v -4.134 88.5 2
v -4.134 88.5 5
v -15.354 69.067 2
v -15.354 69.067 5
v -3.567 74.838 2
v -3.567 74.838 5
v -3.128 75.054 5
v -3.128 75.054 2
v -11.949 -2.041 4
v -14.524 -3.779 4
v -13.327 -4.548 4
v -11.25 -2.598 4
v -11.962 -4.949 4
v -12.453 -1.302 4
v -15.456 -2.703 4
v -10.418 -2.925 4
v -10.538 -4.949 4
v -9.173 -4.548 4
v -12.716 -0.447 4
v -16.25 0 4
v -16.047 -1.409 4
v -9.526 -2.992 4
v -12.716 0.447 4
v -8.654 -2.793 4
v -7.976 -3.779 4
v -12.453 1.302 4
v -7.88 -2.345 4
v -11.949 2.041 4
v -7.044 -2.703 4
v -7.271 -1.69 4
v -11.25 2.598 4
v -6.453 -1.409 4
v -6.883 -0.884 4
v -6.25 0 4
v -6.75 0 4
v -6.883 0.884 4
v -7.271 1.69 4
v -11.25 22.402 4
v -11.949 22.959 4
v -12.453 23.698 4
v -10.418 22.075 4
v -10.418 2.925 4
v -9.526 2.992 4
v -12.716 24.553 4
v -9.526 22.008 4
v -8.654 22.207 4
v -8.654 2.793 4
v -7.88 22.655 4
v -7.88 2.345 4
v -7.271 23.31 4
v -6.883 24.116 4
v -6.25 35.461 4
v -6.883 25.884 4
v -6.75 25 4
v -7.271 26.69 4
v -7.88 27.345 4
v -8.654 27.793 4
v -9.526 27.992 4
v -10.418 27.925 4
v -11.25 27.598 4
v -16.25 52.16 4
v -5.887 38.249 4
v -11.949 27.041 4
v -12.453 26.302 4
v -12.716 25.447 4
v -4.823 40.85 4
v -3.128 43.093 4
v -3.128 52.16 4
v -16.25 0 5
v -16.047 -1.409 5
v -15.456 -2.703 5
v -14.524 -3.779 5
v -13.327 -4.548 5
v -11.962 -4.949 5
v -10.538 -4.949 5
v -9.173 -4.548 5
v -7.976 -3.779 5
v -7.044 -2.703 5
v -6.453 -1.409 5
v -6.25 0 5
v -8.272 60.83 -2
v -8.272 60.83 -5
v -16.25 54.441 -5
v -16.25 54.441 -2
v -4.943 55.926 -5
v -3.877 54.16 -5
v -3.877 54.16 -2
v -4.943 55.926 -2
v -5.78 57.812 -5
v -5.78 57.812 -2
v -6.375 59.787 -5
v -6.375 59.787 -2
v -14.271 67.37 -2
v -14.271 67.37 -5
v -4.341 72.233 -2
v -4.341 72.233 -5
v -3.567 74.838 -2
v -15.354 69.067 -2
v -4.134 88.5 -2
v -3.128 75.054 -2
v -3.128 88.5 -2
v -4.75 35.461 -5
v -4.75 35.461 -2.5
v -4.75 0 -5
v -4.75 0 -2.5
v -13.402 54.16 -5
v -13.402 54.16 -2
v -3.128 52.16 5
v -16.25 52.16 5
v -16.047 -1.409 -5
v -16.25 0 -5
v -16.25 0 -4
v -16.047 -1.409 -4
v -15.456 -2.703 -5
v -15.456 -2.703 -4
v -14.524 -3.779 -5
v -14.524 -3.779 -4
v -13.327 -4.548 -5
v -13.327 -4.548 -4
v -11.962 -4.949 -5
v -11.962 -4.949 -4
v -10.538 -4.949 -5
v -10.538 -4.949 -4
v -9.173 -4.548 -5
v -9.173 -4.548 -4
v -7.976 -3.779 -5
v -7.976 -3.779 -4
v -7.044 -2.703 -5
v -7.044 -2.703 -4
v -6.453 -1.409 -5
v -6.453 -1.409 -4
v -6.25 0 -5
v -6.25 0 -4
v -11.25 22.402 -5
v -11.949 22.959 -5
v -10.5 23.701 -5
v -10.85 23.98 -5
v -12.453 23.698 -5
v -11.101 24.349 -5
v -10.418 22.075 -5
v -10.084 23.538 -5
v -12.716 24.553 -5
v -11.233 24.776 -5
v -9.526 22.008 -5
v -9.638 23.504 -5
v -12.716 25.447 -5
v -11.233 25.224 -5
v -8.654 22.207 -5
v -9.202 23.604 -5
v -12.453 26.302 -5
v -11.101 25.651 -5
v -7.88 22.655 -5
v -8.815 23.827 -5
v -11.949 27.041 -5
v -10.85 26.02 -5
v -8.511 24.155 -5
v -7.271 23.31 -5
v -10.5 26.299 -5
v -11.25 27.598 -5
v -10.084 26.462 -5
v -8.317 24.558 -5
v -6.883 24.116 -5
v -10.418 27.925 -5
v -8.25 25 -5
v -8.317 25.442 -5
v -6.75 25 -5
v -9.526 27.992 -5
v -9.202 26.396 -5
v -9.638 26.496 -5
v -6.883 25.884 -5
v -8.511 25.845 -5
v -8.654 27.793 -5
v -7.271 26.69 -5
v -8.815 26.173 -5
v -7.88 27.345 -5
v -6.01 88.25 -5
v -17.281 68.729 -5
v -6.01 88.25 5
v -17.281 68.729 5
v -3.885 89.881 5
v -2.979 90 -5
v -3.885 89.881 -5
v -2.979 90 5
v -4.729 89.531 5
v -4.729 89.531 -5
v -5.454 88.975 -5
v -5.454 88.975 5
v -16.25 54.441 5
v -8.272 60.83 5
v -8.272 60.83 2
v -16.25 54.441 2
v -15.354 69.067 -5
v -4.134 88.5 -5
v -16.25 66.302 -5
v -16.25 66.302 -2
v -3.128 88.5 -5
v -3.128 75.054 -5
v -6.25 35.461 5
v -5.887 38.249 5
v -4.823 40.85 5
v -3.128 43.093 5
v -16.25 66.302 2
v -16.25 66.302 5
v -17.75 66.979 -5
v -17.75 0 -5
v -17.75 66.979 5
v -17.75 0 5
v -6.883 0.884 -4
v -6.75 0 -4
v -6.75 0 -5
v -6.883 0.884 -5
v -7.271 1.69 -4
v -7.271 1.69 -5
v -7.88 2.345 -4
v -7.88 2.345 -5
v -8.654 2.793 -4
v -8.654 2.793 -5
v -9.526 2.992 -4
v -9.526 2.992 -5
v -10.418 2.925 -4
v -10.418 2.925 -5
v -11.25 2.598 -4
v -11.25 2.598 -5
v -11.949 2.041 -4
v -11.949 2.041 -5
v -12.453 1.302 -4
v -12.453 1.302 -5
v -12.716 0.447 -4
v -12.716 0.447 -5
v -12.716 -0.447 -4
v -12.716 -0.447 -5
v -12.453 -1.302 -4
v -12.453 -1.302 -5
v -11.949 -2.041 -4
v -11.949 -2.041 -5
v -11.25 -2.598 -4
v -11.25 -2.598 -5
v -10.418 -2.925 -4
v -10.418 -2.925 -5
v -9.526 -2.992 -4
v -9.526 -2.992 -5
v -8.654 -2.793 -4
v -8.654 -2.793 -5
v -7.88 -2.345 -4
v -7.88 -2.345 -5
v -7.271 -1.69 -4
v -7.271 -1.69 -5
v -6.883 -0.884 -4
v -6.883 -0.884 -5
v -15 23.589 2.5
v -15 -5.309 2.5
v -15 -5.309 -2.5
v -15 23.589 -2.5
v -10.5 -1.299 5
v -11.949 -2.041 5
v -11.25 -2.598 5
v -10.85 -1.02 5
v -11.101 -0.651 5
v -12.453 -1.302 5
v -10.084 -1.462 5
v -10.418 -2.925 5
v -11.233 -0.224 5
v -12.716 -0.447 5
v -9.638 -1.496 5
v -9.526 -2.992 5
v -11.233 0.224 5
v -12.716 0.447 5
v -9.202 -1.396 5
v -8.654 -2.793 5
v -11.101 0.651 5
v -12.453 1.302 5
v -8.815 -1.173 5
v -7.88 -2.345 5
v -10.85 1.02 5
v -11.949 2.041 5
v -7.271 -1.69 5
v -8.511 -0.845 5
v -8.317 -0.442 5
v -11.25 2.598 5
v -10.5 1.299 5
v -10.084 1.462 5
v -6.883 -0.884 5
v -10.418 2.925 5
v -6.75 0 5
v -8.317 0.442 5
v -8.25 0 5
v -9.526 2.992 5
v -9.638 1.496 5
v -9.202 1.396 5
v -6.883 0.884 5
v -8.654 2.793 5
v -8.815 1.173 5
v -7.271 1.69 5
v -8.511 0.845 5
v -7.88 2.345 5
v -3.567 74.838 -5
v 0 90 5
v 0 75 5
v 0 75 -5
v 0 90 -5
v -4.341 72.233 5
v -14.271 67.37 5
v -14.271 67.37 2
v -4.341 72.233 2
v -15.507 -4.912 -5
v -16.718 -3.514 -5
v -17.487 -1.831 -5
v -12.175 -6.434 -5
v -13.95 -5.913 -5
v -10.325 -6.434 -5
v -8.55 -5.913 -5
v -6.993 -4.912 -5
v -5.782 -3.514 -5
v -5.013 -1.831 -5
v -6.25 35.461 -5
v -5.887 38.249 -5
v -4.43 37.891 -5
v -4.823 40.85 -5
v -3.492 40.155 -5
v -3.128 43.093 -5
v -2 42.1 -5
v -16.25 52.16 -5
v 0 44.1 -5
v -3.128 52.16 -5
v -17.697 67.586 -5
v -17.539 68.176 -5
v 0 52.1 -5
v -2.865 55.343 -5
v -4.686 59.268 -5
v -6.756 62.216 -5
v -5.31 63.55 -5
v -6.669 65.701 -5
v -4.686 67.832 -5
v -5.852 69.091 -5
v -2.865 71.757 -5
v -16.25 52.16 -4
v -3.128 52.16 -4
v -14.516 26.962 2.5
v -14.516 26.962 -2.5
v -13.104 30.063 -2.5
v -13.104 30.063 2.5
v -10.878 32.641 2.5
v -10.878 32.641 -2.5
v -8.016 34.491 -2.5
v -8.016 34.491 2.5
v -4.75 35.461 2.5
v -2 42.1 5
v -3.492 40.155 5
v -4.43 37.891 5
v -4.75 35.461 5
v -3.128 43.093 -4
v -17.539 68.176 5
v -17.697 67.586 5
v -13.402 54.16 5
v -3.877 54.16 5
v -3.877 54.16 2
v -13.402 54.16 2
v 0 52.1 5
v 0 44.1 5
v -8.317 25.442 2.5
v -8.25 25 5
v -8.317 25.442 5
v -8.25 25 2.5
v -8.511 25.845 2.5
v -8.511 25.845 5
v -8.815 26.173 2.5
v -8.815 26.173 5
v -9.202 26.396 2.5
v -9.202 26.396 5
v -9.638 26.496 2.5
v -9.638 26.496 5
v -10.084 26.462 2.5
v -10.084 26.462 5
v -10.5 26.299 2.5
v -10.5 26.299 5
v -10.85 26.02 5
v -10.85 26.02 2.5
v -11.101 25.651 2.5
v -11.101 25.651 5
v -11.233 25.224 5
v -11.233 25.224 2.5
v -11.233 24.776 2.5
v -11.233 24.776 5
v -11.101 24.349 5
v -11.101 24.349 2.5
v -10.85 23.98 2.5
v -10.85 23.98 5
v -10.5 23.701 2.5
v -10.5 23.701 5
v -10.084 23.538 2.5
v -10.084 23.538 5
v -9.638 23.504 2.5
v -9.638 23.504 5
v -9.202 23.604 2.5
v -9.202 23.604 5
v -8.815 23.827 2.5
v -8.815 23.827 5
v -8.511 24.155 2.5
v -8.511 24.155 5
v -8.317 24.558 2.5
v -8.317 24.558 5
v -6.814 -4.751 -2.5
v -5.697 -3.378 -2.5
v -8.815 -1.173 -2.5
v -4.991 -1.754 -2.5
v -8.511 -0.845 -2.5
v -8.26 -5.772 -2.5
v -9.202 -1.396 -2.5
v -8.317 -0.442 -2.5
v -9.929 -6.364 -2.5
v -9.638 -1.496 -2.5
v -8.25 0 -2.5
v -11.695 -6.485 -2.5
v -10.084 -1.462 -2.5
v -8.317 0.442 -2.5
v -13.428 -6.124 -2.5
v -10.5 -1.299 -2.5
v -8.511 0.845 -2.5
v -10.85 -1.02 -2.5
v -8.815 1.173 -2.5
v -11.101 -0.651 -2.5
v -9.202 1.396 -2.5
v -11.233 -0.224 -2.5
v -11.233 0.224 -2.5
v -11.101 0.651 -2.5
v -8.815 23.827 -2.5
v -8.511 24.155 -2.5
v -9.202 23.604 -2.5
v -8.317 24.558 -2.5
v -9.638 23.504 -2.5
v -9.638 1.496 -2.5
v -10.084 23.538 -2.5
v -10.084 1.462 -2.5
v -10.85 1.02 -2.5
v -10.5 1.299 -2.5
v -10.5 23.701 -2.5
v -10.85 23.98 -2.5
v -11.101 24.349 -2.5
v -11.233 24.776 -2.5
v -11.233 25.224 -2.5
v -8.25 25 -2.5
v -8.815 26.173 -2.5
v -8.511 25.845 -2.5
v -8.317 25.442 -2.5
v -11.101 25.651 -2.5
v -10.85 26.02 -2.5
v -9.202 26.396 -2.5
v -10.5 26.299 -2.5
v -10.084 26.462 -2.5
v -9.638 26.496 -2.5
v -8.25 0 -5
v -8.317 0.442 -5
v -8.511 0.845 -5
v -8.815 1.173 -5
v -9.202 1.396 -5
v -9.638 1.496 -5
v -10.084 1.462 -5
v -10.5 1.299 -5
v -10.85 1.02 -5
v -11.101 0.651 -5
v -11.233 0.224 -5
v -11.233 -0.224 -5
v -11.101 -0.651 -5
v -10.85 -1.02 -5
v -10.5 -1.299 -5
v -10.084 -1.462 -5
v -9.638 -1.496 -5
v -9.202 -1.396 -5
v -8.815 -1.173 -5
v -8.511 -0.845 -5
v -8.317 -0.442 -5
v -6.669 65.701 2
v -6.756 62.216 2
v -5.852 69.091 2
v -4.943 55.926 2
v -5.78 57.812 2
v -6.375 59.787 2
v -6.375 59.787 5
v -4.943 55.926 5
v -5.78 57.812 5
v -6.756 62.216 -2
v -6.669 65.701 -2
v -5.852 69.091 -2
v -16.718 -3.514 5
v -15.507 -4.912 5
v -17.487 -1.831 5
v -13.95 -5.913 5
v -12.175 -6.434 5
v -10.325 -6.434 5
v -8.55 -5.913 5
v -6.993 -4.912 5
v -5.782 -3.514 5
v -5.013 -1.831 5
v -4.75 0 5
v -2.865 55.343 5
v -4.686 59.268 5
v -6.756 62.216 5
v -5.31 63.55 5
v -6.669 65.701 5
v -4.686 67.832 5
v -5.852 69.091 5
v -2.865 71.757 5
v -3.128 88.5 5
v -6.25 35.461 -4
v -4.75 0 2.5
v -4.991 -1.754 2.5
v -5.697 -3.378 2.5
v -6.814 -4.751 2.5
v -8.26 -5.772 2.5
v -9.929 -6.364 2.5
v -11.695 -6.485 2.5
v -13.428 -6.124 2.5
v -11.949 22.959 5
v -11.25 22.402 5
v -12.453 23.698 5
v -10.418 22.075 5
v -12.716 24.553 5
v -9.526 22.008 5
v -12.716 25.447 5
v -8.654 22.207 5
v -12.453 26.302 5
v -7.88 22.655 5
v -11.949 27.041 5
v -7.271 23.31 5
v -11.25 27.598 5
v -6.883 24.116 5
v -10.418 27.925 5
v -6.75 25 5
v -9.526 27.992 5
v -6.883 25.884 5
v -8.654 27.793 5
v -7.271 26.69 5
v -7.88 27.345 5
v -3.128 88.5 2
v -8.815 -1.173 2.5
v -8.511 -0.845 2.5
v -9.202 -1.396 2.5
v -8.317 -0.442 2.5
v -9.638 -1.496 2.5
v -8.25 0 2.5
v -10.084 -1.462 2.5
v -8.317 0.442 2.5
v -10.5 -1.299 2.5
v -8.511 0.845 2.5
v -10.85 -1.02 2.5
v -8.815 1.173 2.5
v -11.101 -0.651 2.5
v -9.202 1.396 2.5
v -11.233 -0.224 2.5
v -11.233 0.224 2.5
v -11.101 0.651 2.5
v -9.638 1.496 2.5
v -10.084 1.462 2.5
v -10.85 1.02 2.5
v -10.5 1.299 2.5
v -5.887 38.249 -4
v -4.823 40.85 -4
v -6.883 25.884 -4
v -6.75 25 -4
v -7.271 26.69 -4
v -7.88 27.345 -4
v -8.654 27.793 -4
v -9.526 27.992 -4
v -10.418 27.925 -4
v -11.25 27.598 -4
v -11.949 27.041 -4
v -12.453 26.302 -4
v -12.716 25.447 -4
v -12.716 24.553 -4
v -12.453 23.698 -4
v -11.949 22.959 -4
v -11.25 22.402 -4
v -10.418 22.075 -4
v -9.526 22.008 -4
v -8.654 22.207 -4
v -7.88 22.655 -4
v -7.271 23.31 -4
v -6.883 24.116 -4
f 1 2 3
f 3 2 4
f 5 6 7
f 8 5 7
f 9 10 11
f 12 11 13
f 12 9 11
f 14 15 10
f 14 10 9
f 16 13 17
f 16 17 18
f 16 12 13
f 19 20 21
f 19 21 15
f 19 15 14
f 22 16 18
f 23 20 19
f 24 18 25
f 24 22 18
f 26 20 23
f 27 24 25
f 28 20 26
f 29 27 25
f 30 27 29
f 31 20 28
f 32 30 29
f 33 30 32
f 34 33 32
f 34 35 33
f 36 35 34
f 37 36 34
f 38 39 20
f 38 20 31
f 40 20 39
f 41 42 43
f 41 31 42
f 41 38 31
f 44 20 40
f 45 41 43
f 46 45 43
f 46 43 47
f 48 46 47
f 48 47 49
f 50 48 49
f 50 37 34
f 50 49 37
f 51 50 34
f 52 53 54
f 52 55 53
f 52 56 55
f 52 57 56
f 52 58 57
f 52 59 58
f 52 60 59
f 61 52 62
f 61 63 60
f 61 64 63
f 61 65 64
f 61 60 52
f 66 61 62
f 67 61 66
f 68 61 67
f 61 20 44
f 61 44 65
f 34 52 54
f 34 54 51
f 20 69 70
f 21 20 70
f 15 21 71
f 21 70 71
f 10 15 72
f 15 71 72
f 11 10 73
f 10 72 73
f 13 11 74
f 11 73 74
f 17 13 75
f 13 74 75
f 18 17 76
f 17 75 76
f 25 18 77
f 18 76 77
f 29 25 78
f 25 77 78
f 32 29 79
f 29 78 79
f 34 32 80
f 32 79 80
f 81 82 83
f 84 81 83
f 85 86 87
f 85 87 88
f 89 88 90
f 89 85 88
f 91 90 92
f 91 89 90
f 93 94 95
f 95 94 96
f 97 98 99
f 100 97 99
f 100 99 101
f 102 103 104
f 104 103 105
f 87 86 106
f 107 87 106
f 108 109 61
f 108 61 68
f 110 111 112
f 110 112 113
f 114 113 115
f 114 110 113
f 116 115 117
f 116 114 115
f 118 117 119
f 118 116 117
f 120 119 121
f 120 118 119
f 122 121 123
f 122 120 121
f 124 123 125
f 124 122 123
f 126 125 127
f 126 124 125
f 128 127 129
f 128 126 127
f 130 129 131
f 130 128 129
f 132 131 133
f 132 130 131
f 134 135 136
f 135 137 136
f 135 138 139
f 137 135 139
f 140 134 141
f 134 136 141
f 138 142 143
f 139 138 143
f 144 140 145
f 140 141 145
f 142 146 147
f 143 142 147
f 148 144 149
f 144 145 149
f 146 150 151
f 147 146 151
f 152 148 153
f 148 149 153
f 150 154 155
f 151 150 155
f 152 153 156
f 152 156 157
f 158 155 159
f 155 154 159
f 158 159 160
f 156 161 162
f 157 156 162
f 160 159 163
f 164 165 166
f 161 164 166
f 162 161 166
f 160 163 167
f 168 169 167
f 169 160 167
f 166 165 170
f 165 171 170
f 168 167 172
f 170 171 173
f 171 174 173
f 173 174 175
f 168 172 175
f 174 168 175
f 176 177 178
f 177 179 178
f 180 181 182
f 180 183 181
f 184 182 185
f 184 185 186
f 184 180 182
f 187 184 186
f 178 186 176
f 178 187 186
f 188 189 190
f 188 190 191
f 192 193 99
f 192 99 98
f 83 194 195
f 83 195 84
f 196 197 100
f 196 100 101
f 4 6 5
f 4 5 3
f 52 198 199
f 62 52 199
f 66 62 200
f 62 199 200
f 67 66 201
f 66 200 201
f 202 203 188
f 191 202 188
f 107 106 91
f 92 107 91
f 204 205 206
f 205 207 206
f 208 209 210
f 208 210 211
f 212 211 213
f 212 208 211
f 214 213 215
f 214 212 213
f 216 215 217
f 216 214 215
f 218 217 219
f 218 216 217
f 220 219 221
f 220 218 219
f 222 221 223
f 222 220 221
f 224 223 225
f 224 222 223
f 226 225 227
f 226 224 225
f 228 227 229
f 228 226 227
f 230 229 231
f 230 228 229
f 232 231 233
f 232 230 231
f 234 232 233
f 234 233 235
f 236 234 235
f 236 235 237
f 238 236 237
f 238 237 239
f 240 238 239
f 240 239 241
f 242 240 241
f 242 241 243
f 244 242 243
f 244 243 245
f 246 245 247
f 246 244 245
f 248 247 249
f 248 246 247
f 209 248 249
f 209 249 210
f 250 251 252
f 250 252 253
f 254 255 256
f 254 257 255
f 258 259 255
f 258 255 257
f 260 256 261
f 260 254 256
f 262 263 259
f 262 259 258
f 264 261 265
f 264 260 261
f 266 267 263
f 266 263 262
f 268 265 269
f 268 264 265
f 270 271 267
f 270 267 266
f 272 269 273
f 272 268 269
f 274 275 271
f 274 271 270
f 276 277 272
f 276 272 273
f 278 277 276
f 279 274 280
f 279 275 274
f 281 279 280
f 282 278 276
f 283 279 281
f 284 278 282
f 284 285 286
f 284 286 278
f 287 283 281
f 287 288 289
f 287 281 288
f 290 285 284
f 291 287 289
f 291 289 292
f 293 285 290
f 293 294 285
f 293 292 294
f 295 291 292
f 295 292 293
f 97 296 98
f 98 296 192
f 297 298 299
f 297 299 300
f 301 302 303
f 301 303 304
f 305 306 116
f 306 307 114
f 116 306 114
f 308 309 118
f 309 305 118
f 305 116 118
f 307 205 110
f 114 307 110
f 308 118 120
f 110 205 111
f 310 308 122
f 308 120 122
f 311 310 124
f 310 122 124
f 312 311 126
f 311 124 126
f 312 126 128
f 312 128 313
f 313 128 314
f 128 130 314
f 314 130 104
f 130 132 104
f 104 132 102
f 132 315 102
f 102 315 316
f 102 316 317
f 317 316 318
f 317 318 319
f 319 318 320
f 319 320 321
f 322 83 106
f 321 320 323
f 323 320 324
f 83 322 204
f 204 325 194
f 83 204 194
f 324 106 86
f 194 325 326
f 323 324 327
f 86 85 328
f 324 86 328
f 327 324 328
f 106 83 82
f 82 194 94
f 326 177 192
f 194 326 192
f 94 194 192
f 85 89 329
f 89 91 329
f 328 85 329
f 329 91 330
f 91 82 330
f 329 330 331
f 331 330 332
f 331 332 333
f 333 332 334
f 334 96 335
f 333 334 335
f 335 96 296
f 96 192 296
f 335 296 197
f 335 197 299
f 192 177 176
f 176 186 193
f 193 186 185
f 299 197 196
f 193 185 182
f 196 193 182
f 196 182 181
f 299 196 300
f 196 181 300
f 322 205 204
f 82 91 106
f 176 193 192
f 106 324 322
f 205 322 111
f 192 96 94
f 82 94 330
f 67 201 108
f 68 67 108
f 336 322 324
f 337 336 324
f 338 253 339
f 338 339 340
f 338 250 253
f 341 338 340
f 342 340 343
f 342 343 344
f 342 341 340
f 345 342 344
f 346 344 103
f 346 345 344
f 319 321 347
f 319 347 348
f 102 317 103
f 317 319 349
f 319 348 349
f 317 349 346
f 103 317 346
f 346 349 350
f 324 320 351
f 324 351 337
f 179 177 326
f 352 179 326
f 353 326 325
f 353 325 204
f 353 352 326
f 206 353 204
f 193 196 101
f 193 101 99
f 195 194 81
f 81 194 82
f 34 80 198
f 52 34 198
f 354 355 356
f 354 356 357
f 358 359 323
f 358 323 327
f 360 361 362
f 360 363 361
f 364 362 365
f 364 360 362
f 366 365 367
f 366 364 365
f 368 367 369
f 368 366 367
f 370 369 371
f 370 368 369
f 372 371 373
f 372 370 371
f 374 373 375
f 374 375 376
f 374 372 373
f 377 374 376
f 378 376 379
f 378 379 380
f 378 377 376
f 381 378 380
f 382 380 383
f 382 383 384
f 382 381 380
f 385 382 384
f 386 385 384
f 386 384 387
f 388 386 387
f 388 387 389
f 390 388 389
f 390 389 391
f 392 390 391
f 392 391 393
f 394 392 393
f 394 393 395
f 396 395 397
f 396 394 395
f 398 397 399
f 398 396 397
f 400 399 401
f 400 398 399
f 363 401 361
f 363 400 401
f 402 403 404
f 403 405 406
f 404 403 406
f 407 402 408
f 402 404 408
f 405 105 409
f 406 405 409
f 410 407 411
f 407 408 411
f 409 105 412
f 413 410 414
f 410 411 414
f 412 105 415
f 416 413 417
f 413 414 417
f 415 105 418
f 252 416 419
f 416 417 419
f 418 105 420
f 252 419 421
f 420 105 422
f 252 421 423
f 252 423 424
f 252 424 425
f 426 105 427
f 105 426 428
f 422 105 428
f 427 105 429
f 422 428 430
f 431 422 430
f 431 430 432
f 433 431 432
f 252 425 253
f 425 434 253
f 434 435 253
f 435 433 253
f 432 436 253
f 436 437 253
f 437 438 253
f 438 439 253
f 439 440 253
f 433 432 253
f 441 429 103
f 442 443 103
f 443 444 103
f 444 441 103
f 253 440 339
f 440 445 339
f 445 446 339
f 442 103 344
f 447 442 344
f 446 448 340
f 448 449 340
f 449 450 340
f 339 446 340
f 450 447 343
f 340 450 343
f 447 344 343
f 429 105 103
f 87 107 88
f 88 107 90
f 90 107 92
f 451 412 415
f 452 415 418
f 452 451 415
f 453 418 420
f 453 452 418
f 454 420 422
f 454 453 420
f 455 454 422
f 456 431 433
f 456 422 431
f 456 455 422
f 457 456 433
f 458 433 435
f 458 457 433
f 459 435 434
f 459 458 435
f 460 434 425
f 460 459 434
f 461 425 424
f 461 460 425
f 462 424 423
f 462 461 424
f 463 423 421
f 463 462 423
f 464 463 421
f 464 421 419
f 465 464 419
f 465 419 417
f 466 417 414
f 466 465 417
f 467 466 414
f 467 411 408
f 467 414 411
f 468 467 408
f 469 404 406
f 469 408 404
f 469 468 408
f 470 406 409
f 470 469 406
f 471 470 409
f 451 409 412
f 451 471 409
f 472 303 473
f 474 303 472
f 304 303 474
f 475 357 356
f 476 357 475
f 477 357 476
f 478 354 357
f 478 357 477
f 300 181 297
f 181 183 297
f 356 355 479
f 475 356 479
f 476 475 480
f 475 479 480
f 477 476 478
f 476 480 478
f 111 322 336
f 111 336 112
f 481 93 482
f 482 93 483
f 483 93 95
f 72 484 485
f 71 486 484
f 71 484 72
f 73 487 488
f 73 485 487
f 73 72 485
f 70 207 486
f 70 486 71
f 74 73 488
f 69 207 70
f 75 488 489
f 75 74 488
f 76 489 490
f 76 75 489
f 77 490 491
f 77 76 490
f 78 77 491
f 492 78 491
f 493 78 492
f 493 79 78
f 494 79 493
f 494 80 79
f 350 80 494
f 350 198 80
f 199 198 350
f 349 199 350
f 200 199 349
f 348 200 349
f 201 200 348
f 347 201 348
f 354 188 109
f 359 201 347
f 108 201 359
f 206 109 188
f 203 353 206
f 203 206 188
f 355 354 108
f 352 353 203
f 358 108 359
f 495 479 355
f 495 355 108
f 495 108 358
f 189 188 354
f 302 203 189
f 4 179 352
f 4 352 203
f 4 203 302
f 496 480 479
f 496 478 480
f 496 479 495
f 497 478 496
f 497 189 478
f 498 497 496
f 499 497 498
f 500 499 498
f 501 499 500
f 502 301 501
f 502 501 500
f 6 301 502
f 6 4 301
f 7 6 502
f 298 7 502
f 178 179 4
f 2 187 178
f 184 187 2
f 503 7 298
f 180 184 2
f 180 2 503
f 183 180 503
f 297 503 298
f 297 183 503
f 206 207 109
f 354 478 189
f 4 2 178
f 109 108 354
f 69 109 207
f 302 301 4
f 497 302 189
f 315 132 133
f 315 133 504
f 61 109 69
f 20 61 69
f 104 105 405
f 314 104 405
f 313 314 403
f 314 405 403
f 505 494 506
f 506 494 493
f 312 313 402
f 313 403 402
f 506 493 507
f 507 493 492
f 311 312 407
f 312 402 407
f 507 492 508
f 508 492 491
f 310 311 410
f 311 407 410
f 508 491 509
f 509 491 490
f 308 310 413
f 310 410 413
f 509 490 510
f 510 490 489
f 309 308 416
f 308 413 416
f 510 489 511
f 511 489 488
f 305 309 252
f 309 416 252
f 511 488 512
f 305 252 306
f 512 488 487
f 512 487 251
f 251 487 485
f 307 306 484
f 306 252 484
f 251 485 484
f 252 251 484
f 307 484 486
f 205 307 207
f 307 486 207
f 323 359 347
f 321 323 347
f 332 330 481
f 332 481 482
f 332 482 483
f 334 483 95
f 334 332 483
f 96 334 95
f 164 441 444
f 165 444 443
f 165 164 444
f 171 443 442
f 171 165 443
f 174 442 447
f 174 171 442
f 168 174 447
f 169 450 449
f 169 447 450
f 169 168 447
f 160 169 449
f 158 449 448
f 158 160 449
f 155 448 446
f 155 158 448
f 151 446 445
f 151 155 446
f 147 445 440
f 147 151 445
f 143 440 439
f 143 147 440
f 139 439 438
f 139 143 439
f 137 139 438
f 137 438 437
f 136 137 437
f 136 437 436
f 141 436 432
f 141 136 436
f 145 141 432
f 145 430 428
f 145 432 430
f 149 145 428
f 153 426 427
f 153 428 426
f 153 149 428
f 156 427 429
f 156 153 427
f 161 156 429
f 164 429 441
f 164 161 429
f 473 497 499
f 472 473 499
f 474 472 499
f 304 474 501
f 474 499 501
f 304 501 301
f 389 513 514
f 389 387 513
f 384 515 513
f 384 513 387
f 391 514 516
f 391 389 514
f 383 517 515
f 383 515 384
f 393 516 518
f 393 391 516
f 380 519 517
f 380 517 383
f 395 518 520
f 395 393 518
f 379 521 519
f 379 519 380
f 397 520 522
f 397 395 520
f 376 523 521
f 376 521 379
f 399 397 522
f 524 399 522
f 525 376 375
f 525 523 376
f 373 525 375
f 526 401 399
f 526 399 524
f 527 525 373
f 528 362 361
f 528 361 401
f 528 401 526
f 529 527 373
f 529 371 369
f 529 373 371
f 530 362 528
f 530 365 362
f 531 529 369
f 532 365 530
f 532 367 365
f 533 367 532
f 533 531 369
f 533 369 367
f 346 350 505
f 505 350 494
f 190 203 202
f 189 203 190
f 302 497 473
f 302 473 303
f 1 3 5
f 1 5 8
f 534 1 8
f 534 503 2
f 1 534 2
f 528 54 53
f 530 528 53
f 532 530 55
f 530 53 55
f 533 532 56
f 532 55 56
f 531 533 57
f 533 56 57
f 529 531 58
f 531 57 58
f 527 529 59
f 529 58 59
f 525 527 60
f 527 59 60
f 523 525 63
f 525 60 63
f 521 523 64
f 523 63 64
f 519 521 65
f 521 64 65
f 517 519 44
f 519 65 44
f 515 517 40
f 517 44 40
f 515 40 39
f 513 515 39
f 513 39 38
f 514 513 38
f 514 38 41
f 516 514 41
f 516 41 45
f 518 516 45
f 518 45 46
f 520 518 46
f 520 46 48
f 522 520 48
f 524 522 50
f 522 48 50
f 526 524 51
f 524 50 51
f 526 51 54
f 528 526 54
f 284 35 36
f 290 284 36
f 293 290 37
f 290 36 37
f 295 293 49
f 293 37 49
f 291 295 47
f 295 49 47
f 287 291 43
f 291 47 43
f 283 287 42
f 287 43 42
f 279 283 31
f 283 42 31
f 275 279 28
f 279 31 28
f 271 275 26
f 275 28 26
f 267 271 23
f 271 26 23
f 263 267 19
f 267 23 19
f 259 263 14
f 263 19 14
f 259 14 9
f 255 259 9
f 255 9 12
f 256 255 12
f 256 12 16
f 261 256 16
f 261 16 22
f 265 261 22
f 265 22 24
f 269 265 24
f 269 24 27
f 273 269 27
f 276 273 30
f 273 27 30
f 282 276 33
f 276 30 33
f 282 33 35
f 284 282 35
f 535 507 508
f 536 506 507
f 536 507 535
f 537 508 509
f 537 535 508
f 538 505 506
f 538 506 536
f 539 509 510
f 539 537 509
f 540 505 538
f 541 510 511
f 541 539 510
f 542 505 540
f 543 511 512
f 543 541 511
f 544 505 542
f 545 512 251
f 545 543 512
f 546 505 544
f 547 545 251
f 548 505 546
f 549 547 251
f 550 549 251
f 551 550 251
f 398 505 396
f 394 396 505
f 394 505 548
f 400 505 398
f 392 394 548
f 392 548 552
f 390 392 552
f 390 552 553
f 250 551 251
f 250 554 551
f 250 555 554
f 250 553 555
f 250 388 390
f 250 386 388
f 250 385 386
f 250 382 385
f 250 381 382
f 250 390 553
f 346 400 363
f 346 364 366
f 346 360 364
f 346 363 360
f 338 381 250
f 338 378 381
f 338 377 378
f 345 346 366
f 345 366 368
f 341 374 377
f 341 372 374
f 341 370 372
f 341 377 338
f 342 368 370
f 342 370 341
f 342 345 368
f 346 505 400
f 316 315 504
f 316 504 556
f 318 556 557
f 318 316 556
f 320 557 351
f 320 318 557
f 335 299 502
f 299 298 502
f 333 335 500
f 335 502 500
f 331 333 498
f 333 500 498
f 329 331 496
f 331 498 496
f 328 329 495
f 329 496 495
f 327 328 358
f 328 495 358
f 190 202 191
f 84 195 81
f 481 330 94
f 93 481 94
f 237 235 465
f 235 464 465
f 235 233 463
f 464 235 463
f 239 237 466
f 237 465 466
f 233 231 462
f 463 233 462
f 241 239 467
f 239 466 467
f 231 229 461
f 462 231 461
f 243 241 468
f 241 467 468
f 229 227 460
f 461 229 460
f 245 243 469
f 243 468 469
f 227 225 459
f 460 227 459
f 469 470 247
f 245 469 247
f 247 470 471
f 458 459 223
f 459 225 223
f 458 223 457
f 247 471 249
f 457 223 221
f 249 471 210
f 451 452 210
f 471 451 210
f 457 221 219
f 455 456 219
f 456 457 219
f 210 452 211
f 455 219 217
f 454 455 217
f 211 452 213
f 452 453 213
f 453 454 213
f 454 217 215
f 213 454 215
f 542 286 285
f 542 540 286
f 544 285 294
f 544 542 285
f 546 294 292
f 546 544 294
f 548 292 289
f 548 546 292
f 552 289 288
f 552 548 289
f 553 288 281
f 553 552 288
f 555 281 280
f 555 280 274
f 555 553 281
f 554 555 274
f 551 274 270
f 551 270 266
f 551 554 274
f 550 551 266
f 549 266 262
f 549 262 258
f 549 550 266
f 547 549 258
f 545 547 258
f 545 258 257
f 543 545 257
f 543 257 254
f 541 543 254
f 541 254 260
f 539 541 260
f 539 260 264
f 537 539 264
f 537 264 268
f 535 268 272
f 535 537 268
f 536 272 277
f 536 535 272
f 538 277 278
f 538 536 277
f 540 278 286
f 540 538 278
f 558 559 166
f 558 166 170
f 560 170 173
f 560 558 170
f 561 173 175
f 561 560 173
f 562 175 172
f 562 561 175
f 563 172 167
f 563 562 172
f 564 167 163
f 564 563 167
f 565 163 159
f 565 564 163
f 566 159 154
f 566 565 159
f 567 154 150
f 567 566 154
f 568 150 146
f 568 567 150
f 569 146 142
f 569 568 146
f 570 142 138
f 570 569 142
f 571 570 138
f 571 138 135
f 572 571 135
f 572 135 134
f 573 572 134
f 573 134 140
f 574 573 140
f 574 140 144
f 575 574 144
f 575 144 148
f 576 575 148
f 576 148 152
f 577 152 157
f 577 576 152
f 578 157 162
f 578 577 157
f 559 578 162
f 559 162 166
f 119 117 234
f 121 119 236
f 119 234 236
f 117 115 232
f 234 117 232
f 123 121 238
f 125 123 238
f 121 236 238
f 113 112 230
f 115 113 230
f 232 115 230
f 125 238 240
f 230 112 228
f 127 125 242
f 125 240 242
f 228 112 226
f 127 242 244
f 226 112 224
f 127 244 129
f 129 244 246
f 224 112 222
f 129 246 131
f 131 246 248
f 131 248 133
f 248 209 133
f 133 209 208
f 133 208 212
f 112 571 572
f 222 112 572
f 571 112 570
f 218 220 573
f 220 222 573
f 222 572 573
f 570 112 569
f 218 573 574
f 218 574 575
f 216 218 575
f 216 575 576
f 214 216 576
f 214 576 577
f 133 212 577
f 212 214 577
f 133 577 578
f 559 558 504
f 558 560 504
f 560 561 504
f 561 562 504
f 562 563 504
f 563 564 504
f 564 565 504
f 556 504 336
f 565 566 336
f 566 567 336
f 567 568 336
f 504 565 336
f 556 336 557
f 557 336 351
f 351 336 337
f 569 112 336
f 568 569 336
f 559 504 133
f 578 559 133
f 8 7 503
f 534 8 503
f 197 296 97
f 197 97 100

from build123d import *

# Parameters (mm, degrees)
SKETCH1_R           = 1.5
BOSS_EXTRUDE1_DEPTH = 5
CUT_EXTRUDE1_DEPTH  = 2.5
CUT_EXTRUDE3_DEPTH  = 1
SKETCH4_R           = 3
SKETCH4_R_2         = 1.5
EXTRUDE_THIN1_DEPTH = 1
CUT_EXTRUDE4_DEPTH  = 2
EXTRUDE_THIN2_REACH = 94.277
BOSS_EXTRUDE2_REACH = 94.277
FILLET1_R           = 3.5
BOSS_EXTRUDE8_DEPTH = 10


with BuildPart() as part:
    # Sketch1 → Boss-Extrude1 (new, symmetric)
    with BuildSketch(Plane.XY):
        with BuildLine():
            Line((0, 88.5), (-2, 86.5))
            Line((-2, 86.5), (0, 84.5))
            Line((0, 84.5), (-2, 82.5))
            Line((-2, 82.5), (0, 80.5))
            Line((0, 80.5), (-2, 78.5))
            Line((-2, 78.5), (0, 76.5))
            Line((0, 76.5), (0, 75))
            ThreePointArc((0, 75), (-5.309927761, 63.55), (0, 52.1))
            Line((0, 52.1), (-2, 50.1))
            Line((-2, 50.1), (0, 48.1))
            Line((0, 48.1), (-2, 46.1))
            Line((-2, 46.1), (0, 44.1))
            Line((0, 44.1), (-2, 42.1))
            ThreePointArc((-2, 42.1), (-4.035298286, 39.053960857), (-4.75, 35.460912703))
            Line((-4.75, 35.460912703), (-4.75, 0))
            ThreePointArc((-4.75, 0), (-11.25, -6.5), (-17.75, 0))
            Line((-17.75, 0), (-17.75, 67.916352203))
            Line((-17.75, 67.916352203), (-5, 90))
            Line((-5, 90), (0, 90))
            Line((0, 90), (0, 88.5))
        make_face()
        with Locations((-9.75, 0)):
            Circle(SKETCH1_R, mode=Mode.SUBTRACT)
        with Locations((-9.75, 25)):
            Circle(SKETCH1_R, mode=Mode.SUBTRACT)
    extrude(amount=BOSS_EXTRUDE1_DEPTH, both=True)

    # Sketch2 → Cut-Extrude1 (cut, symmetric)
    with BuildSketch(Plane.XY):
        with BuildLine():
            Line((-15, -8.410797367), (-15, 23.589202633))
            ThreePointArc((-15, 23.589202633), (-12.082951062, 31.431396204), (-4.75, 35.460912703))
            Line((-4.75, 35.460912703), (-4.75, -8.410797367))
            Line((-4.75, -8.410797367), (-15, -8.410797367))
        make_face()
    cut_extrude1 = extrude(amount=CUT_EXTRUDE1_DEPTH, both=True, mode=Mode.SUBTRACT)

    # Sketch3 → Cut-Extrude3 (cut)
    with BuildSketch(Plane.XY.offset(5)):
        with BuildLine():
            Line((-3.12764747, 88.5), (-4.133974596, 88.5))
            Line((-4.133974596, 88.5), (-16.25, 67.514428415))
            Line((-16.25, 67.514428415), (-16.25, 0))
            ThreePointArc((-16.25, 0), (-11.25, -5), (-6.25, 0))
            Line((-6.25, 0), (-6.25, 35.460912703))
            ThreePointArc((-6.25, 35.460912703), (-5.439227916, 39.583992212), (-3.12764747, 43.093084951))
            Line((-3.12764747, 43.093084951), (-3.12764747, 53.159809364))
            ThreePointArc((-3.12764747, 53.159809364), (-6.809927761, 63.55), (-3.12764747, 73.940190636))
            Line((-3.12764747, 73.940190636), (-3.12764747, 88.5))
        make_face()
    cut_extrude3 = extrude(amount=-CUT_EXTRUDE3_DEPTH, mode=Mode.SUBTRACT)

    # Sketch4 → Extrude-Thin1 (add)
    # profile 1 of 2: a face of its own
    with BuildSketch(Plane.XY.offset(4)):
        with Locations((-9.75, 25)):
            Circle(SKETCH4_R)
        with Locations((-9.75, 25)):
            Circle(SKETCH4_R_2, mode=Mode.SUBTRACT)
    # profile 2 of 2: a face of its own
    with BuildSketch(Plane.XY.offset(4)):
        with Locations((-9.75, 0)):
            Circle(SKETCH4_R)
        with Locations((-9.75, 0)):
            Circle(SKETCH4_R_2, mode=Mode.SUBTRACT)
    extrude_thin1 = extrude(amount=EXTRUDE_THIN1_DEPTH)

    # Sketch5 → Cut-Extrude4 (cut)
    with BuildSketch(Plane.XY.offset(4)):
        with BuildLine():
            Line((-16.25, 53.159809364), (-3.12764747, 53.159809364))
            ThreePointArc((-3.12764747, 53.159809364), (-6.809927761, 63.55), (-3.12764747, 73.940190636))
            Line((-3.12764747, 73.940190636), (-3.12764747, 88.5))
            Line((-3.12764747, 88.5), (-4.133974596, 88.5))
            Line((-4.133974596, 88.5), (-16.25, 67.514428415))
            Line((-16.25, 67.514428415), (-16.25, 53.159809364))
        make_face()
    cut_extrude4 = extrude(amount=-CUT_EXTRUDE4_DEPTH, mode=Mode.SUBTRACT)

    # Sketch6 → Extrude-Thin2 (add, up to next)
    with BuildSketch(Plane.XY.offset(5), mode=Mode.PRIVATE) as extrude_thin2_sk1:
        Polygon((-3.12764747, 54.159809364), (-13.401600212, 54.159809364), (-4.917118083, 60.954664271), (-14.27124031, 67.369931467), (-2.68786351, 73.042087041), (-3.56743143, 74.838294232), (-18.22875969, 67.658925362), (-8.271898443, 60.830286203), (-19.098399788, 52.159809364), (-3.12764747, 52.159809364), align=None)
    extrude_thin2_tool1 = extrude(extrude_thin2_sk1.sketch, amount=-EXTRUDE_THIN2_REACH, mode=Mode.PRIVATE) - part.part
    extrude_thin2 = extrude_thin2_tool1.solids().sort_by_distance((-8.264624, 53.879877, 5))[0]
    add(extrude_thin2)

    # Sketch7 → Boss-Extrude2 (add, up to next)
    with BuildSketch(Plane.XY.offset(5), mode=Mode.PRIVATE) as boss_extrude2_sk1:
        Polygon((-3.12764747, 73.940190636), (-3.56743143, 74.838294232), (-3.12764747, 75.053647931), align=None)
    boss_extrude2_tool1 = extrude(boss_extrude2_sk1.sketch, amount=-BOSS_EXTRUDE2_REACH, mode=Mode.PRIVATE) - part.part
    boss_extrude2 = boss_extrude2_tool1.solids().sort_by_distance((-3.274242, 74.610711, 5))[0]
    add(boss_extrude2)

    # Mirror2: Cut-Extrude1, Cut-Extrude3, Extrude-Thin1, Cut-Extrude4, Extrude-Thin2, Boss-Extrude2 across plane
    add(cut_extrude1.mirror(Plane.XY), mode=Mode.SUBTRACT)
    add(cut_extrude3.mirror(Plane.XY), mode=Mode.SUBTRACT)
    add(extrude_thin1.mirror(Plane.XY))
    add(cut_extrude4.mirror(Plane.XY), mode=Mode.SUBTRACT)
    add(extrude_thin2.mirror(Plane.XY))
    add(boss_extrude2.mirror(Plane.XY))

    # Fillet1
    fillet1_edges = [part.edges().sort_by_distance(p)[0] for p in [
        (-17.75, 67.916352203, 0),
        (-5, 90, 0),
    ]]
    fillet(fillet1_edges, radius=FILLET1_R)

    # Sketch11 → Boss-Extrude8 (add)
    with BuildSketch(Plane.XY.offset(5)):
        Polygon((0, 84.5), (0, 88.5), (-2, 86.5), align=None)
        Polygon((0, 80.5), (0, 84.5), (-2, 82.5), align=None)
        Polygon((0, 76.5), (0, 80.5), (-2, 78.5), align=None)
        Polygon((0, 48.1), (0, 52.1), (-2, 50.1), align=None)
        Polygon((0, 44.1), (0, 48.1), (-2, 46.1), align=None)
    extrude(amount=-BOSS_EXTRUDE8_DEPTH)


solid = part.part
